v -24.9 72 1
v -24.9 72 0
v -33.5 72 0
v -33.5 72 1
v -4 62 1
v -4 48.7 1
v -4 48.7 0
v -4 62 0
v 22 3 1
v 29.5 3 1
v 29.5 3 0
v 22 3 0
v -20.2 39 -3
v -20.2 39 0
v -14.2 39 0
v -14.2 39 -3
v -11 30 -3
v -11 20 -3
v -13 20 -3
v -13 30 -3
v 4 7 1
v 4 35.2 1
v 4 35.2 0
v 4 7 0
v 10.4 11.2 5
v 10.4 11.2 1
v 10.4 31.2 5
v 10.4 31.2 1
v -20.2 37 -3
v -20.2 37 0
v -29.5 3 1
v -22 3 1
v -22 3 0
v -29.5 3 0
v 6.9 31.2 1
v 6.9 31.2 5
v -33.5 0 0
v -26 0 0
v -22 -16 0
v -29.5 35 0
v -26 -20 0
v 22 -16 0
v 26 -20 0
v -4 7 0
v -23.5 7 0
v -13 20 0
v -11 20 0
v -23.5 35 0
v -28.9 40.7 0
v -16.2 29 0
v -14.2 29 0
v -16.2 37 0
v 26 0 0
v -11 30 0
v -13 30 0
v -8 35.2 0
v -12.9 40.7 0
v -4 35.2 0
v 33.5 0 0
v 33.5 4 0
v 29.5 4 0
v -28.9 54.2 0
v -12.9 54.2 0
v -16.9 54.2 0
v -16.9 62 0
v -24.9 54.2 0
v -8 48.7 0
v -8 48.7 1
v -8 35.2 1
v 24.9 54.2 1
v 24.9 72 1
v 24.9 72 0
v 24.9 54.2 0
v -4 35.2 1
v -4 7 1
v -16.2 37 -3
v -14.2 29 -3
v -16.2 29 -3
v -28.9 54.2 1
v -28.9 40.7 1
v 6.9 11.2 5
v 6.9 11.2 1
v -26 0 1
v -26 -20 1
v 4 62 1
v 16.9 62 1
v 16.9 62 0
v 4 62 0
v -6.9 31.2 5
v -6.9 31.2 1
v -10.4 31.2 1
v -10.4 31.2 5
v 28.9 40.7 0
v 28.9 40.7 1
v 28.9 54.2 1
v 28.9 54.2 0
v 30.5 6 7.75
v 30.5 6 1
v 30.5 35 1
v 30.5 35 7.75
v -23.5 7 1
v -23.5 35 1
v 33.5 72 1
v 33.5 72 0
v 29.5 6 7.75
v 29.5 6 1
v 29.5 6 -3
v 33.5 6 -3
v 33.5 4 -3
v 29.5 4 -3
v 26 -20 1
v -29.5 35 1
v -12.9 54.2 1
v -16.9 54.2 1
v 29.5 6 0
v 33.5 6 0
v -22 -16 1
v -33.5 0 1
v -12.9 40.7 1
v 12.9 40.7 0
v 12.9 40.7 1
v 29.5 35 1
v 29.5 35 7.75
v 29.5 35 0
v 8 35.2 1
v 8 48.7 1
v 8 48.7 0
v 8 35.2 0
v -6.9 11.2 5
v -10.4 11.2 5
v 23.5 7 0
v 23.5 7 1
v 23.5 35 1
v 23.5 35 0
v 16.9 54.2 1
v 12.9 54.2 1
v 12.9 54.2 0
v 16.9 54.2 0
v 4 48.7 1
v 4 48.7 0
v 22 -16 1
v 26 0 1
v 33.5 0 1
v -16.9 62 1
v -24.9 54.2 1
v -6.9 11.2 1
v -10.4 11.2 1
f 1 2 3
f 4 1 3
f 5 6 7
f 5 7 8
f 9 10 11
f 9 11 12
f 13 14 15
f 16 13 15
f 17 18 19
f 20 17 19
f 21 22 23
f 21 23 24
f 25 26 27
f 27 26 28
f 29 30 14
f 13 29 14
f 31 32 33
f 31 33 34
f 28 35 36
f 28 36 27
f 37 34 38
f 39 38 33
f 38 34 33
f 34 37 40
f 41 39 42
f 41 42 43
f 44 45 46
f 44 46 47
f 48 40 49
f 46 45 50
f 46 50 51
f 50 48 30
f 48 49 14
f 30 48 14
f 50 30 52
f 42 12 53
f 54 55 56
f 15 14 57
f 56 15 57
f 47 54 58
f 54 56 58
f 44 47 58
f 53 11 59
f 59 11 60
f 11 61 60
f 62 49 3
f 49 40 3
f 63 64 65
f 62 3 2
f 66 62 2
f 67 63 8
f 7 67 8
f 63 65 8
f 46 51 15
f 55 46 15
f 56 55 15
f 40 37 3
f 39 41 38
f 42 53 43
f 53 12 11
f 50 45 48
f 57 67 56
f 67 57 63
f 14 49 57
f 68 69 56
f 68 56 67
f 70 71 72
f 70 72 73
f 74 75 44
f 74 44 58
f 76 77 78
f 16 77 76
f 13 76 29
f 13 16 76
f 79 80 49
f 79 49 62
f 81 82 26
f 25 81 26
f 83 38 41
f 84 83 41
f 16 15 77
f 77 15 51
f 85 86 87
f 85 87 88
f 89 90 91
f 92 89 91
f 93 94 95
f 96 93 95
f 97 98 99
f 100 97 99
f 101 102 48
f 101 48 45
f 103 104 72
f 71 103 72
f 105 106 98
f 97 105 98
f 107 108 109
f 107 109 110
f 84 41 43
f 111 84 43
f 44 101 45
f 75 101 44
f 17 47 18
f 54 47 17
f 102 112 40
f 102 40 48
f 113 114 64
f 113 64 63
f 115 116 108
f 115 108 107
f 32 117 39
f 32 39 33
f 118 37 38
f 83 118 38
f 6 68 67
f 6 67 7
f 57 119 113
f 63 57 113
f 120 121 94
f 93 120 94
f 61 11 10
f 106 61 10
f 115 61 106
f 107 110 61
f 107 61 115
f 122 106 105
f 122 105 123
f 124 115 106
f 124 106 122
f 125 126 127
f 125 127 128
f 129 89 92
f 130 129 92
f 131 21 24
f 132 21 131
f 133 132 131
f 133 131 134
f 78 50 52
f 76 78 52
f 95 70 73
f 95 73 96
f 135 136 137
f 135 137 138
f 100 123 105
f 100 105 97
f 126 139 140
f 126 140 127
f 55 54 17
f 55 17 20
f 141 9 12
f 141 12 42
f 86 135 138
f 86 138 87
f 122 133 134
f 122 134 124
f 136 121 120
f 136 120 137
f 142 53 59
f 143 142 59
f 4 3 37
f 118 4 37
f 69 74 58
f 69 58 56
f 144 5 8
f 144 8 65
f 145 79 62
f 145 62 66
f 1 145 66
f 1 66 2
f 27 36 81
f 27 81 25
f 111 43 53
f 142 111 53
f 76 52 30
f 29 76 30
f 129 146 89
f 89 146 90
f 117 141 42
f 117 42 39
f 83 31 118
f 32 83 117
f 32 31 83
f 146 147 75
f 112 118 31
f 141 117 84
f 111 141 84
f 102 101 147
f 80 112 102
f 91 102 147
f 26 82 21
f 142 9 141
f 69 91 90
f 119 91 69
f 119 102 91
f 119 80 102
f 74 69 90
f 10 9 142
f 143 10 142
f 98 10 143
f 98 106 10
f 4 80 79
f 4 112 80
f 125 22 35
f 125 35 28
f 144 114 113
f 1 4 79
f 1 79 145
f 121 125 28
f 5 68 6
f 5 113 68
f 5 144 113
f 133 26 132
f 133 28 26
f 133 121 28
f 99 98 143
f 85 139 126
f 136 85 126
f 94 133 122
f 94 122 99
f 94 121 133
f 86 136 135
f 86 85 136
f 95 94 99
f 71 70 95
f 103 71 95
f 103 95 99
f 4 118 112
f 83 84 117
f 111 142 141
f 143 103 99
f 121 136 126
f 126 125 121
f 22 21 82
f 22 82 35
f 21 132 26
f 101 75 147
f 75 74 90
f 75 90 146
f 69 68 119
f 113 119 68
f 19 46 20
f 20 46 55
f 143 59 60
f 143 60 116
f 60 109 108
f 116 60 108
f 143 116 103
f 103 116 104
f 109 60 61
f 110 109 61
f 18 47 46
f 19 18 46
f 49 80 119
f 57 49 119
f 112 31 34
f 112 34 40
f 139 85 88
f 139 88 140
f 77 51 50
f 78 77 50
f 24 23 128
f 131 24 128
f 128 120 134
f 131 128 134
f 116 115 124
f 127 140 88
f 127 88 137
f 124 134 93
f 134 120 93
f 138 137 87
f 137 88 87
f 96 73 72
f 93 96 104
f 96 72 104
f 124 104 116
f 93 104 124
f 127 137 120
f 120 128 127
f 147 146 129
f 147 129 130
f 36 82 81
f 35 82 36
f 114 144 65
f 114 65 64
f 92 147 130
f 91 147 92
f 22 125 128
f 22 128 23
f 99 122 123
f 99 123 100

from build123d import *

# Parameters (mm, degrees)
BOSS_EXTRUDE1_DEPTH = 1
SKETCH2_W           = 16
SKETCH2_H           = 13.5
CUT_EXTRUDE2_DEPTH  = 1
SKETCH5_W           = 1
SKETCH5_H           = 29
BOSS_EXTRUDE3_DEPTH = 6.75
SKETCH6_W           = 3.5
SKETCH6_H           = 20
BOSS_EXTRUDE4_DEPTH = 4
SKETCH7_W           = 4
SKETCH7_H           = 2
SKETCH7_W_2         = 2
SKETCH7_H_2         = 10
BOSS_EXTRUDE5_DEPTH = 3


with BuildPart() as part:
    # Sketch1 → Boss-Extrude1 (new body)
    with BuildSketch(Plane.XY):
        Polygon((0, 0), (0, 72), (-33.5, 72), (-33.5, 0), (-26, 0), align=None)
        Polygon((26, 0), (33.5, 0), (33.5, 72), (0, 72), (0, 0), align=None)
        Polygon((26, -20), (26, 0), (0, 0), (-26, 0), (-26, -20), align=None)
    extrude(amount=BOSS_EXTRUDE1_DEPTH)

    # Sketch2 → Cut-Extrude2 (cut)
    with BuildSketch(Plane.XY.offset(1)):
        Polygon((22, -16), (-22, -16), (-22, 3), (-29.5, 3), (-29.5, 35), (-23.5, 35), (-23.5, 7), (-4, 7), (-4, 35.2), (-8, 35.2), (-8, 48.7), (-4, 48.7), (-4, 62), (-16.9, 62), (-16.9, 54.2), (-24.9, 54.2), (-24.9, 72), (-16.9, 72), (16.9, 72), (24.9, 72), (24.9, 54.2), (16.9, 54.2), (16.9, 62), (4, 62), (4, 48.7), (8, 48.7), (8, 35.2), (4, 35.2), (4, 7), (23.5, 7), (23.5, 35), (29.5, 35), (29.5, 3), (22, 3), align=None)
        with Locations((20.9, 47.45)):
            Rectangle(SKETCH2_W, SKETCH2_H)
        with Locations((-20.9, 47.45)):
            Rectangle(SKETCH2_W, SKETCH2_H)
    extrude(amount=-CUT_EXTRUDE2_DEPTH, mode=Mode.SUBTRACT)

    # Sketch5 → Boss-Extrude3 (add)
    with BuildSketch(Plane.XY.offset(1)):
        with Locations((30, 20.5)):
            Rectangle(SKETCH5_W, SKETCH5_H)
    extrude(amount=BOSS_EXTRUDE3_DEPTH)

    # Sketch6 → Boss-Extrude4 (add)
    with BuildSketch(Plane.XY.offset(1)):
        with Locations((8.65, 21.2)):
            Rectangle(SKETCH6_W, SKETCH6_H)
    boss_extrude4 = extrude(amount=BOSS_EXTRUDE4_DEPTH)

    # Mirror1: Boss-Extrude4 across plane
    add(boss_extrude4.mirror(Plane(origin=(0, 0, 0), x_dir=(0, 0, 1), z_dir=(1, 0, 0))))

    # Sketch7 → Boss-Extrude5 (add)
    with BuildSketch(Plane(origin=(0, 0, 0), x_dir=(-1, 0, 0), z_dir=(0, 0, -1))):
        Polygon((14.2, 29), (16.2, 29), (16.2, 37), (20.2, 37), (20.2, 39), (16.2, 39), (14.2, 39), align=None)
        with Locations((-31.5, 5)):
            Rectangle(SKETCH7_W, SKETCH7_H)
        with Locations((12, 25)):
            Rectangle(SKETCH7_W_2, SKETCH7_H_2)
    extrude(amount=BOSS_EXTRUDE5_DEPTH)


solid = part.part
